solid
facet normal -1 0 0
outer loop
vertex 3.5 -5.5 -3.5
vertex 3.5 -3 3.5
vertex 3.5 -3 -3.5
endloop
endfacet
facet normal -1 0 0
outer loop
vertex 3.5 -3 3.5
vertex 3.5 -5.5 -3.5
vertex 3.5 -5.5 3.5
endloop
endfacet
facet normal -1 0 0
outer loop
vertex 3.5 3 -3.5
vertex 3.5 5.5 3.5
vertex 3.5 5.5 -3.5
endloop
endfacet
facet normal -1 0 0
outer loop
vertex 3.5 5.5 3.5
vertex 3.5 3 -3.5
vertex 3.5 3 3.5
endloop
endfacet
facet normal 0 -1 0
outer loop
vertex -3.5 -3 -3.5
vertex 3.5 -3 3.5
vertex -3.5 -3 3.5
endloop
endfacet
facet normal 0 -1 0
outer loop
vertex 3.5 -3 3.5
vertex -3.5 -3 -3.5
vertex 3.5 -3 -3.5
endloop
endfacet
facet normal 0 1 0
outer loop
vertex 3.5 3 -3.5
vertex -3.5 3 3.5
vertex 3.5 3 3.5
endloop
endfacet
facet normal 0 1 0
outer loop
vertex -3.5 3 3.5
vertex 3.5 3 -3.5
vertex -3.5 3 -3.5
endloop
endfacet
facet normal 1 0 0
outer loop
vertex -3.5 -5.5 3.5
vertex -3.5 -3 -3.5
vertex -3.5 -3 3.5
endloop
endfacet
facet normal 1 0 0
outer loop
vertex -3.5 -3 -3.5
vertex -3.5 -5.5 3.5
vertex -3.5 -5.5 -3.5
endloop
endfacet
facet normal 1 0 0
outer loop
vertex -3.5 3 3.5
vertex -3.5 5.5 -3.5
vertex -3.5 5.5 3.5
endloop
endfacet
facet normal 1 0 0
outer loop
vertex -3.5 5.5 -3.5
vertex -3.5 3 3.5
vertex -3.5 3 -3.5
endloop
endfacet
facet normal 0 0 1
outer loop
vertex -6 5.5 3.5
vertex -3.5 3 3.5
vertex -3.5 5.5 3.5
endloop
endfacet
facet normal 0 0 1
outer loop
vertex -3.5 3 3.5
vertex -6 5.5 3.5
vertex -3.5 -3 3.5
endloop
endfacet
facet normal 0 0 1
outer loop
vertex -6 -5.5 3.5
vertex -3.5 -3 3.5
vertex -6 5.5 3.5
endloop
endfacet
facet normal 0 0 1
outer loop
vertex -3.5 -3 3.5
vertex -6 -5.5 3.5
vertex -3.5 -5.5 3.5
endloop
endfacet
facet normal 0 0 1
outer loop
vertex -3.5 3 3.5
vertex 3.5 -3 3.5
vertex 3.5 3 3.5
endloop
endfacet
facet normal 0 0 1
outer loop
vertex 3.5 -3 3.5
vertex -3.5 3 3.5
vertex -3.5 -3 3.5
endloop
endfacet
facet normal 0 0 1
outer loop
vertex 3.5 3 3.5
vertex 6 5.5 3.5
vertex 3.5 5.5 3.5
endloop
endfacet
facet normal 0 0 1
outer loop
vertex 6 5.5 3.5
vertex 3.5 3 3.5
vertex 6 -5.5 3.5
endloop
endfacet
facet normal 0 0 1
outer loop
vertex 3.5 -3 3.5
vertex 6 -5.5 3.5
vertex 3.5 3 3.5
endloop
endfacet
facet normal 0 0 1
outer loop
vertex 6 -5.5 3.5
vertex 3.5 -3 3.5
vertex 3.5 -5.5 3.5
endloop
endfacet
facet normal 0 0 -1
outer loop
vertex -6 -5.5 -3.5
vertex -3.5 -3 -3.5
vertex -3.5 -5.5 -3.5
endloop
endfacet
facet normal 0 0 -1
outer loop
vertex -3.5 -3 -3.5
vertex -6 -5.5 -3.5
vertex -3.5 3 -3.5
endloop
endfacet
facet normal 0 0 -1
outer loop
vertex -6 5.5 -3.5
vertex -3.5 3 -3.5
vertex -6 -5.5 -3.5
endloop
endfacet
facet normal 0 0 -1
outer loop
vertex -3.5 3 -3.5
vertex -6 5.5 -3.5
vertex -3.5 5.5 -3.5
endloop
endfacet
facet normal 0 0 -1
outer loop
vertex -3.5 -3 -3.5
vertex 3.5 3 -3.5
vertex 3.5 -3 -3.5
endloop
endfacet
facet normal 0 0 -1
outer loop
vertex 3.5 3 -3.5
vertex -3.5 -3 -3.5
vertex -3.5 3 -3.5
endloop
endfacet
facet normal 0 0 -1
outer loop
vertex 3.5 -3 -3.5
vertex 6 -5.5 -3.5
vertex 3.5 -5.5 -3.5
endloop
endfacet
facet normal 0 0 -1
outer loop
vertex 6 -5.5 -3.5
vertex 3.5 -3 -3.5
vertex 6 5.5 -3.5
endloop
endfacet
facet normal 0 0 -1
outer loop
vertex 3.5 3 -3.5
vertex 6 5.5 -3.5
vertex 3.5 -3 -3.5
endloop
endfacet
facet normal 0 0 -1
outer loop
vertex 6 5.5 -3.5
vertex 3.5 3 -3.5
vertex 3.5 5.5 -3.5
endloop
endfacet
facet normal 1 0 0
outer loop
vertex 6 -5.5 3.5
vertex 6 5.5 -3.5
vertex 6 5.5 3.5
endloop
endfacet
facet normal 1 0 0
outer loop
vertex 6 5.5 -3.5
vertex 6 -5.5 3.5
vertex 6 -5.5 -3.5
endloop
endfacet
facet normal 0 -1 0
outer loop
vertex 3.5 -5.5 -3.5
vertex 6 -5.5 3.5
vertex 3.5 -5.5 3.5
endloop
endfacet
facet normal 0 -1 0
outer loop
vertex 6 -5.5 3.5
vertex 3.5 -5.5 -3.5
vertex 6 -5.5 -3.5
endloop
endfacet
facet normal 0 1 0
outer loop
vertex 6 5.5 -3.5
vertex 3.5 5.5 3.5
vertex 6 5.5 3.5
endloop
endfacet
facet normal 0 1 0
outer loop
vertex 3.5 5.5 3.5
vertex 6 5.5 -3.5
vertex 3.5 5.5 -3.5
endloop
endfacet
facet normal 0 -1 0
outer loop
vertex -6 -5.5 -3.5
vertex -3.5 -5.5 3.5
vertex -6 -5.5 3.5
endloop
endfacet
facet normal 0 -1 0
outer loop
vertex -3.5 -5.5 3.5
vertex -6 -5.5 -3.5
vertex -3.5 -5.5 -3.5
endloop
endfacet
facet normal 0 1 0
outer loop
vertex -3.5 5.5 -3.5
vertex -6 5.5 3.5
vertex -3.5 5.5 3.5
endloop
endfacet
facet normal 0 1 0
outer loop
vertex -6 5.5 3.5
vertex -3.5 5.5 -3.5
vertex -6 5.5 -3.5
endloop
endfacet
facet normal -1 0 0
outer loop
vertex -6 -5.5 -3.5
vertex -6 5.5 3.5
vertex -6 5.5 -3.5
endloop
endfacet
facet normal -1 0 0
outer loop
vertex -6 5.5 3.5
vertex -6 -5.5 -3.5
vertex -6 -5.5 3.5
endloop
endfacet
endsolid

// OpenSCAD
$fa=0.5; // default minimum facet angle is now 0.5
$fs=0.5; // default minimum facet size is now 0.5 mm

separator_width = 7;
separator_thickness = 6;
wall_height = 4;
wall_thickness = 2.5;

rotate([90, 0, 0])
union() {
    cube([separator_width, separator_width, separator_thickness], center = true);
    translate([separator_width/2 + wall_thickness/2, 0, 0]) cube([wall_thickness, separator_width, wall_thickness * 2 + separator_thickness], center = true);
    translate([-separator_width/2 - wall_thickness/2, 0, 0]) cube([wall_thickness, separator_width, wall_thickness * 2 + separator_thickness], center = true);
};
